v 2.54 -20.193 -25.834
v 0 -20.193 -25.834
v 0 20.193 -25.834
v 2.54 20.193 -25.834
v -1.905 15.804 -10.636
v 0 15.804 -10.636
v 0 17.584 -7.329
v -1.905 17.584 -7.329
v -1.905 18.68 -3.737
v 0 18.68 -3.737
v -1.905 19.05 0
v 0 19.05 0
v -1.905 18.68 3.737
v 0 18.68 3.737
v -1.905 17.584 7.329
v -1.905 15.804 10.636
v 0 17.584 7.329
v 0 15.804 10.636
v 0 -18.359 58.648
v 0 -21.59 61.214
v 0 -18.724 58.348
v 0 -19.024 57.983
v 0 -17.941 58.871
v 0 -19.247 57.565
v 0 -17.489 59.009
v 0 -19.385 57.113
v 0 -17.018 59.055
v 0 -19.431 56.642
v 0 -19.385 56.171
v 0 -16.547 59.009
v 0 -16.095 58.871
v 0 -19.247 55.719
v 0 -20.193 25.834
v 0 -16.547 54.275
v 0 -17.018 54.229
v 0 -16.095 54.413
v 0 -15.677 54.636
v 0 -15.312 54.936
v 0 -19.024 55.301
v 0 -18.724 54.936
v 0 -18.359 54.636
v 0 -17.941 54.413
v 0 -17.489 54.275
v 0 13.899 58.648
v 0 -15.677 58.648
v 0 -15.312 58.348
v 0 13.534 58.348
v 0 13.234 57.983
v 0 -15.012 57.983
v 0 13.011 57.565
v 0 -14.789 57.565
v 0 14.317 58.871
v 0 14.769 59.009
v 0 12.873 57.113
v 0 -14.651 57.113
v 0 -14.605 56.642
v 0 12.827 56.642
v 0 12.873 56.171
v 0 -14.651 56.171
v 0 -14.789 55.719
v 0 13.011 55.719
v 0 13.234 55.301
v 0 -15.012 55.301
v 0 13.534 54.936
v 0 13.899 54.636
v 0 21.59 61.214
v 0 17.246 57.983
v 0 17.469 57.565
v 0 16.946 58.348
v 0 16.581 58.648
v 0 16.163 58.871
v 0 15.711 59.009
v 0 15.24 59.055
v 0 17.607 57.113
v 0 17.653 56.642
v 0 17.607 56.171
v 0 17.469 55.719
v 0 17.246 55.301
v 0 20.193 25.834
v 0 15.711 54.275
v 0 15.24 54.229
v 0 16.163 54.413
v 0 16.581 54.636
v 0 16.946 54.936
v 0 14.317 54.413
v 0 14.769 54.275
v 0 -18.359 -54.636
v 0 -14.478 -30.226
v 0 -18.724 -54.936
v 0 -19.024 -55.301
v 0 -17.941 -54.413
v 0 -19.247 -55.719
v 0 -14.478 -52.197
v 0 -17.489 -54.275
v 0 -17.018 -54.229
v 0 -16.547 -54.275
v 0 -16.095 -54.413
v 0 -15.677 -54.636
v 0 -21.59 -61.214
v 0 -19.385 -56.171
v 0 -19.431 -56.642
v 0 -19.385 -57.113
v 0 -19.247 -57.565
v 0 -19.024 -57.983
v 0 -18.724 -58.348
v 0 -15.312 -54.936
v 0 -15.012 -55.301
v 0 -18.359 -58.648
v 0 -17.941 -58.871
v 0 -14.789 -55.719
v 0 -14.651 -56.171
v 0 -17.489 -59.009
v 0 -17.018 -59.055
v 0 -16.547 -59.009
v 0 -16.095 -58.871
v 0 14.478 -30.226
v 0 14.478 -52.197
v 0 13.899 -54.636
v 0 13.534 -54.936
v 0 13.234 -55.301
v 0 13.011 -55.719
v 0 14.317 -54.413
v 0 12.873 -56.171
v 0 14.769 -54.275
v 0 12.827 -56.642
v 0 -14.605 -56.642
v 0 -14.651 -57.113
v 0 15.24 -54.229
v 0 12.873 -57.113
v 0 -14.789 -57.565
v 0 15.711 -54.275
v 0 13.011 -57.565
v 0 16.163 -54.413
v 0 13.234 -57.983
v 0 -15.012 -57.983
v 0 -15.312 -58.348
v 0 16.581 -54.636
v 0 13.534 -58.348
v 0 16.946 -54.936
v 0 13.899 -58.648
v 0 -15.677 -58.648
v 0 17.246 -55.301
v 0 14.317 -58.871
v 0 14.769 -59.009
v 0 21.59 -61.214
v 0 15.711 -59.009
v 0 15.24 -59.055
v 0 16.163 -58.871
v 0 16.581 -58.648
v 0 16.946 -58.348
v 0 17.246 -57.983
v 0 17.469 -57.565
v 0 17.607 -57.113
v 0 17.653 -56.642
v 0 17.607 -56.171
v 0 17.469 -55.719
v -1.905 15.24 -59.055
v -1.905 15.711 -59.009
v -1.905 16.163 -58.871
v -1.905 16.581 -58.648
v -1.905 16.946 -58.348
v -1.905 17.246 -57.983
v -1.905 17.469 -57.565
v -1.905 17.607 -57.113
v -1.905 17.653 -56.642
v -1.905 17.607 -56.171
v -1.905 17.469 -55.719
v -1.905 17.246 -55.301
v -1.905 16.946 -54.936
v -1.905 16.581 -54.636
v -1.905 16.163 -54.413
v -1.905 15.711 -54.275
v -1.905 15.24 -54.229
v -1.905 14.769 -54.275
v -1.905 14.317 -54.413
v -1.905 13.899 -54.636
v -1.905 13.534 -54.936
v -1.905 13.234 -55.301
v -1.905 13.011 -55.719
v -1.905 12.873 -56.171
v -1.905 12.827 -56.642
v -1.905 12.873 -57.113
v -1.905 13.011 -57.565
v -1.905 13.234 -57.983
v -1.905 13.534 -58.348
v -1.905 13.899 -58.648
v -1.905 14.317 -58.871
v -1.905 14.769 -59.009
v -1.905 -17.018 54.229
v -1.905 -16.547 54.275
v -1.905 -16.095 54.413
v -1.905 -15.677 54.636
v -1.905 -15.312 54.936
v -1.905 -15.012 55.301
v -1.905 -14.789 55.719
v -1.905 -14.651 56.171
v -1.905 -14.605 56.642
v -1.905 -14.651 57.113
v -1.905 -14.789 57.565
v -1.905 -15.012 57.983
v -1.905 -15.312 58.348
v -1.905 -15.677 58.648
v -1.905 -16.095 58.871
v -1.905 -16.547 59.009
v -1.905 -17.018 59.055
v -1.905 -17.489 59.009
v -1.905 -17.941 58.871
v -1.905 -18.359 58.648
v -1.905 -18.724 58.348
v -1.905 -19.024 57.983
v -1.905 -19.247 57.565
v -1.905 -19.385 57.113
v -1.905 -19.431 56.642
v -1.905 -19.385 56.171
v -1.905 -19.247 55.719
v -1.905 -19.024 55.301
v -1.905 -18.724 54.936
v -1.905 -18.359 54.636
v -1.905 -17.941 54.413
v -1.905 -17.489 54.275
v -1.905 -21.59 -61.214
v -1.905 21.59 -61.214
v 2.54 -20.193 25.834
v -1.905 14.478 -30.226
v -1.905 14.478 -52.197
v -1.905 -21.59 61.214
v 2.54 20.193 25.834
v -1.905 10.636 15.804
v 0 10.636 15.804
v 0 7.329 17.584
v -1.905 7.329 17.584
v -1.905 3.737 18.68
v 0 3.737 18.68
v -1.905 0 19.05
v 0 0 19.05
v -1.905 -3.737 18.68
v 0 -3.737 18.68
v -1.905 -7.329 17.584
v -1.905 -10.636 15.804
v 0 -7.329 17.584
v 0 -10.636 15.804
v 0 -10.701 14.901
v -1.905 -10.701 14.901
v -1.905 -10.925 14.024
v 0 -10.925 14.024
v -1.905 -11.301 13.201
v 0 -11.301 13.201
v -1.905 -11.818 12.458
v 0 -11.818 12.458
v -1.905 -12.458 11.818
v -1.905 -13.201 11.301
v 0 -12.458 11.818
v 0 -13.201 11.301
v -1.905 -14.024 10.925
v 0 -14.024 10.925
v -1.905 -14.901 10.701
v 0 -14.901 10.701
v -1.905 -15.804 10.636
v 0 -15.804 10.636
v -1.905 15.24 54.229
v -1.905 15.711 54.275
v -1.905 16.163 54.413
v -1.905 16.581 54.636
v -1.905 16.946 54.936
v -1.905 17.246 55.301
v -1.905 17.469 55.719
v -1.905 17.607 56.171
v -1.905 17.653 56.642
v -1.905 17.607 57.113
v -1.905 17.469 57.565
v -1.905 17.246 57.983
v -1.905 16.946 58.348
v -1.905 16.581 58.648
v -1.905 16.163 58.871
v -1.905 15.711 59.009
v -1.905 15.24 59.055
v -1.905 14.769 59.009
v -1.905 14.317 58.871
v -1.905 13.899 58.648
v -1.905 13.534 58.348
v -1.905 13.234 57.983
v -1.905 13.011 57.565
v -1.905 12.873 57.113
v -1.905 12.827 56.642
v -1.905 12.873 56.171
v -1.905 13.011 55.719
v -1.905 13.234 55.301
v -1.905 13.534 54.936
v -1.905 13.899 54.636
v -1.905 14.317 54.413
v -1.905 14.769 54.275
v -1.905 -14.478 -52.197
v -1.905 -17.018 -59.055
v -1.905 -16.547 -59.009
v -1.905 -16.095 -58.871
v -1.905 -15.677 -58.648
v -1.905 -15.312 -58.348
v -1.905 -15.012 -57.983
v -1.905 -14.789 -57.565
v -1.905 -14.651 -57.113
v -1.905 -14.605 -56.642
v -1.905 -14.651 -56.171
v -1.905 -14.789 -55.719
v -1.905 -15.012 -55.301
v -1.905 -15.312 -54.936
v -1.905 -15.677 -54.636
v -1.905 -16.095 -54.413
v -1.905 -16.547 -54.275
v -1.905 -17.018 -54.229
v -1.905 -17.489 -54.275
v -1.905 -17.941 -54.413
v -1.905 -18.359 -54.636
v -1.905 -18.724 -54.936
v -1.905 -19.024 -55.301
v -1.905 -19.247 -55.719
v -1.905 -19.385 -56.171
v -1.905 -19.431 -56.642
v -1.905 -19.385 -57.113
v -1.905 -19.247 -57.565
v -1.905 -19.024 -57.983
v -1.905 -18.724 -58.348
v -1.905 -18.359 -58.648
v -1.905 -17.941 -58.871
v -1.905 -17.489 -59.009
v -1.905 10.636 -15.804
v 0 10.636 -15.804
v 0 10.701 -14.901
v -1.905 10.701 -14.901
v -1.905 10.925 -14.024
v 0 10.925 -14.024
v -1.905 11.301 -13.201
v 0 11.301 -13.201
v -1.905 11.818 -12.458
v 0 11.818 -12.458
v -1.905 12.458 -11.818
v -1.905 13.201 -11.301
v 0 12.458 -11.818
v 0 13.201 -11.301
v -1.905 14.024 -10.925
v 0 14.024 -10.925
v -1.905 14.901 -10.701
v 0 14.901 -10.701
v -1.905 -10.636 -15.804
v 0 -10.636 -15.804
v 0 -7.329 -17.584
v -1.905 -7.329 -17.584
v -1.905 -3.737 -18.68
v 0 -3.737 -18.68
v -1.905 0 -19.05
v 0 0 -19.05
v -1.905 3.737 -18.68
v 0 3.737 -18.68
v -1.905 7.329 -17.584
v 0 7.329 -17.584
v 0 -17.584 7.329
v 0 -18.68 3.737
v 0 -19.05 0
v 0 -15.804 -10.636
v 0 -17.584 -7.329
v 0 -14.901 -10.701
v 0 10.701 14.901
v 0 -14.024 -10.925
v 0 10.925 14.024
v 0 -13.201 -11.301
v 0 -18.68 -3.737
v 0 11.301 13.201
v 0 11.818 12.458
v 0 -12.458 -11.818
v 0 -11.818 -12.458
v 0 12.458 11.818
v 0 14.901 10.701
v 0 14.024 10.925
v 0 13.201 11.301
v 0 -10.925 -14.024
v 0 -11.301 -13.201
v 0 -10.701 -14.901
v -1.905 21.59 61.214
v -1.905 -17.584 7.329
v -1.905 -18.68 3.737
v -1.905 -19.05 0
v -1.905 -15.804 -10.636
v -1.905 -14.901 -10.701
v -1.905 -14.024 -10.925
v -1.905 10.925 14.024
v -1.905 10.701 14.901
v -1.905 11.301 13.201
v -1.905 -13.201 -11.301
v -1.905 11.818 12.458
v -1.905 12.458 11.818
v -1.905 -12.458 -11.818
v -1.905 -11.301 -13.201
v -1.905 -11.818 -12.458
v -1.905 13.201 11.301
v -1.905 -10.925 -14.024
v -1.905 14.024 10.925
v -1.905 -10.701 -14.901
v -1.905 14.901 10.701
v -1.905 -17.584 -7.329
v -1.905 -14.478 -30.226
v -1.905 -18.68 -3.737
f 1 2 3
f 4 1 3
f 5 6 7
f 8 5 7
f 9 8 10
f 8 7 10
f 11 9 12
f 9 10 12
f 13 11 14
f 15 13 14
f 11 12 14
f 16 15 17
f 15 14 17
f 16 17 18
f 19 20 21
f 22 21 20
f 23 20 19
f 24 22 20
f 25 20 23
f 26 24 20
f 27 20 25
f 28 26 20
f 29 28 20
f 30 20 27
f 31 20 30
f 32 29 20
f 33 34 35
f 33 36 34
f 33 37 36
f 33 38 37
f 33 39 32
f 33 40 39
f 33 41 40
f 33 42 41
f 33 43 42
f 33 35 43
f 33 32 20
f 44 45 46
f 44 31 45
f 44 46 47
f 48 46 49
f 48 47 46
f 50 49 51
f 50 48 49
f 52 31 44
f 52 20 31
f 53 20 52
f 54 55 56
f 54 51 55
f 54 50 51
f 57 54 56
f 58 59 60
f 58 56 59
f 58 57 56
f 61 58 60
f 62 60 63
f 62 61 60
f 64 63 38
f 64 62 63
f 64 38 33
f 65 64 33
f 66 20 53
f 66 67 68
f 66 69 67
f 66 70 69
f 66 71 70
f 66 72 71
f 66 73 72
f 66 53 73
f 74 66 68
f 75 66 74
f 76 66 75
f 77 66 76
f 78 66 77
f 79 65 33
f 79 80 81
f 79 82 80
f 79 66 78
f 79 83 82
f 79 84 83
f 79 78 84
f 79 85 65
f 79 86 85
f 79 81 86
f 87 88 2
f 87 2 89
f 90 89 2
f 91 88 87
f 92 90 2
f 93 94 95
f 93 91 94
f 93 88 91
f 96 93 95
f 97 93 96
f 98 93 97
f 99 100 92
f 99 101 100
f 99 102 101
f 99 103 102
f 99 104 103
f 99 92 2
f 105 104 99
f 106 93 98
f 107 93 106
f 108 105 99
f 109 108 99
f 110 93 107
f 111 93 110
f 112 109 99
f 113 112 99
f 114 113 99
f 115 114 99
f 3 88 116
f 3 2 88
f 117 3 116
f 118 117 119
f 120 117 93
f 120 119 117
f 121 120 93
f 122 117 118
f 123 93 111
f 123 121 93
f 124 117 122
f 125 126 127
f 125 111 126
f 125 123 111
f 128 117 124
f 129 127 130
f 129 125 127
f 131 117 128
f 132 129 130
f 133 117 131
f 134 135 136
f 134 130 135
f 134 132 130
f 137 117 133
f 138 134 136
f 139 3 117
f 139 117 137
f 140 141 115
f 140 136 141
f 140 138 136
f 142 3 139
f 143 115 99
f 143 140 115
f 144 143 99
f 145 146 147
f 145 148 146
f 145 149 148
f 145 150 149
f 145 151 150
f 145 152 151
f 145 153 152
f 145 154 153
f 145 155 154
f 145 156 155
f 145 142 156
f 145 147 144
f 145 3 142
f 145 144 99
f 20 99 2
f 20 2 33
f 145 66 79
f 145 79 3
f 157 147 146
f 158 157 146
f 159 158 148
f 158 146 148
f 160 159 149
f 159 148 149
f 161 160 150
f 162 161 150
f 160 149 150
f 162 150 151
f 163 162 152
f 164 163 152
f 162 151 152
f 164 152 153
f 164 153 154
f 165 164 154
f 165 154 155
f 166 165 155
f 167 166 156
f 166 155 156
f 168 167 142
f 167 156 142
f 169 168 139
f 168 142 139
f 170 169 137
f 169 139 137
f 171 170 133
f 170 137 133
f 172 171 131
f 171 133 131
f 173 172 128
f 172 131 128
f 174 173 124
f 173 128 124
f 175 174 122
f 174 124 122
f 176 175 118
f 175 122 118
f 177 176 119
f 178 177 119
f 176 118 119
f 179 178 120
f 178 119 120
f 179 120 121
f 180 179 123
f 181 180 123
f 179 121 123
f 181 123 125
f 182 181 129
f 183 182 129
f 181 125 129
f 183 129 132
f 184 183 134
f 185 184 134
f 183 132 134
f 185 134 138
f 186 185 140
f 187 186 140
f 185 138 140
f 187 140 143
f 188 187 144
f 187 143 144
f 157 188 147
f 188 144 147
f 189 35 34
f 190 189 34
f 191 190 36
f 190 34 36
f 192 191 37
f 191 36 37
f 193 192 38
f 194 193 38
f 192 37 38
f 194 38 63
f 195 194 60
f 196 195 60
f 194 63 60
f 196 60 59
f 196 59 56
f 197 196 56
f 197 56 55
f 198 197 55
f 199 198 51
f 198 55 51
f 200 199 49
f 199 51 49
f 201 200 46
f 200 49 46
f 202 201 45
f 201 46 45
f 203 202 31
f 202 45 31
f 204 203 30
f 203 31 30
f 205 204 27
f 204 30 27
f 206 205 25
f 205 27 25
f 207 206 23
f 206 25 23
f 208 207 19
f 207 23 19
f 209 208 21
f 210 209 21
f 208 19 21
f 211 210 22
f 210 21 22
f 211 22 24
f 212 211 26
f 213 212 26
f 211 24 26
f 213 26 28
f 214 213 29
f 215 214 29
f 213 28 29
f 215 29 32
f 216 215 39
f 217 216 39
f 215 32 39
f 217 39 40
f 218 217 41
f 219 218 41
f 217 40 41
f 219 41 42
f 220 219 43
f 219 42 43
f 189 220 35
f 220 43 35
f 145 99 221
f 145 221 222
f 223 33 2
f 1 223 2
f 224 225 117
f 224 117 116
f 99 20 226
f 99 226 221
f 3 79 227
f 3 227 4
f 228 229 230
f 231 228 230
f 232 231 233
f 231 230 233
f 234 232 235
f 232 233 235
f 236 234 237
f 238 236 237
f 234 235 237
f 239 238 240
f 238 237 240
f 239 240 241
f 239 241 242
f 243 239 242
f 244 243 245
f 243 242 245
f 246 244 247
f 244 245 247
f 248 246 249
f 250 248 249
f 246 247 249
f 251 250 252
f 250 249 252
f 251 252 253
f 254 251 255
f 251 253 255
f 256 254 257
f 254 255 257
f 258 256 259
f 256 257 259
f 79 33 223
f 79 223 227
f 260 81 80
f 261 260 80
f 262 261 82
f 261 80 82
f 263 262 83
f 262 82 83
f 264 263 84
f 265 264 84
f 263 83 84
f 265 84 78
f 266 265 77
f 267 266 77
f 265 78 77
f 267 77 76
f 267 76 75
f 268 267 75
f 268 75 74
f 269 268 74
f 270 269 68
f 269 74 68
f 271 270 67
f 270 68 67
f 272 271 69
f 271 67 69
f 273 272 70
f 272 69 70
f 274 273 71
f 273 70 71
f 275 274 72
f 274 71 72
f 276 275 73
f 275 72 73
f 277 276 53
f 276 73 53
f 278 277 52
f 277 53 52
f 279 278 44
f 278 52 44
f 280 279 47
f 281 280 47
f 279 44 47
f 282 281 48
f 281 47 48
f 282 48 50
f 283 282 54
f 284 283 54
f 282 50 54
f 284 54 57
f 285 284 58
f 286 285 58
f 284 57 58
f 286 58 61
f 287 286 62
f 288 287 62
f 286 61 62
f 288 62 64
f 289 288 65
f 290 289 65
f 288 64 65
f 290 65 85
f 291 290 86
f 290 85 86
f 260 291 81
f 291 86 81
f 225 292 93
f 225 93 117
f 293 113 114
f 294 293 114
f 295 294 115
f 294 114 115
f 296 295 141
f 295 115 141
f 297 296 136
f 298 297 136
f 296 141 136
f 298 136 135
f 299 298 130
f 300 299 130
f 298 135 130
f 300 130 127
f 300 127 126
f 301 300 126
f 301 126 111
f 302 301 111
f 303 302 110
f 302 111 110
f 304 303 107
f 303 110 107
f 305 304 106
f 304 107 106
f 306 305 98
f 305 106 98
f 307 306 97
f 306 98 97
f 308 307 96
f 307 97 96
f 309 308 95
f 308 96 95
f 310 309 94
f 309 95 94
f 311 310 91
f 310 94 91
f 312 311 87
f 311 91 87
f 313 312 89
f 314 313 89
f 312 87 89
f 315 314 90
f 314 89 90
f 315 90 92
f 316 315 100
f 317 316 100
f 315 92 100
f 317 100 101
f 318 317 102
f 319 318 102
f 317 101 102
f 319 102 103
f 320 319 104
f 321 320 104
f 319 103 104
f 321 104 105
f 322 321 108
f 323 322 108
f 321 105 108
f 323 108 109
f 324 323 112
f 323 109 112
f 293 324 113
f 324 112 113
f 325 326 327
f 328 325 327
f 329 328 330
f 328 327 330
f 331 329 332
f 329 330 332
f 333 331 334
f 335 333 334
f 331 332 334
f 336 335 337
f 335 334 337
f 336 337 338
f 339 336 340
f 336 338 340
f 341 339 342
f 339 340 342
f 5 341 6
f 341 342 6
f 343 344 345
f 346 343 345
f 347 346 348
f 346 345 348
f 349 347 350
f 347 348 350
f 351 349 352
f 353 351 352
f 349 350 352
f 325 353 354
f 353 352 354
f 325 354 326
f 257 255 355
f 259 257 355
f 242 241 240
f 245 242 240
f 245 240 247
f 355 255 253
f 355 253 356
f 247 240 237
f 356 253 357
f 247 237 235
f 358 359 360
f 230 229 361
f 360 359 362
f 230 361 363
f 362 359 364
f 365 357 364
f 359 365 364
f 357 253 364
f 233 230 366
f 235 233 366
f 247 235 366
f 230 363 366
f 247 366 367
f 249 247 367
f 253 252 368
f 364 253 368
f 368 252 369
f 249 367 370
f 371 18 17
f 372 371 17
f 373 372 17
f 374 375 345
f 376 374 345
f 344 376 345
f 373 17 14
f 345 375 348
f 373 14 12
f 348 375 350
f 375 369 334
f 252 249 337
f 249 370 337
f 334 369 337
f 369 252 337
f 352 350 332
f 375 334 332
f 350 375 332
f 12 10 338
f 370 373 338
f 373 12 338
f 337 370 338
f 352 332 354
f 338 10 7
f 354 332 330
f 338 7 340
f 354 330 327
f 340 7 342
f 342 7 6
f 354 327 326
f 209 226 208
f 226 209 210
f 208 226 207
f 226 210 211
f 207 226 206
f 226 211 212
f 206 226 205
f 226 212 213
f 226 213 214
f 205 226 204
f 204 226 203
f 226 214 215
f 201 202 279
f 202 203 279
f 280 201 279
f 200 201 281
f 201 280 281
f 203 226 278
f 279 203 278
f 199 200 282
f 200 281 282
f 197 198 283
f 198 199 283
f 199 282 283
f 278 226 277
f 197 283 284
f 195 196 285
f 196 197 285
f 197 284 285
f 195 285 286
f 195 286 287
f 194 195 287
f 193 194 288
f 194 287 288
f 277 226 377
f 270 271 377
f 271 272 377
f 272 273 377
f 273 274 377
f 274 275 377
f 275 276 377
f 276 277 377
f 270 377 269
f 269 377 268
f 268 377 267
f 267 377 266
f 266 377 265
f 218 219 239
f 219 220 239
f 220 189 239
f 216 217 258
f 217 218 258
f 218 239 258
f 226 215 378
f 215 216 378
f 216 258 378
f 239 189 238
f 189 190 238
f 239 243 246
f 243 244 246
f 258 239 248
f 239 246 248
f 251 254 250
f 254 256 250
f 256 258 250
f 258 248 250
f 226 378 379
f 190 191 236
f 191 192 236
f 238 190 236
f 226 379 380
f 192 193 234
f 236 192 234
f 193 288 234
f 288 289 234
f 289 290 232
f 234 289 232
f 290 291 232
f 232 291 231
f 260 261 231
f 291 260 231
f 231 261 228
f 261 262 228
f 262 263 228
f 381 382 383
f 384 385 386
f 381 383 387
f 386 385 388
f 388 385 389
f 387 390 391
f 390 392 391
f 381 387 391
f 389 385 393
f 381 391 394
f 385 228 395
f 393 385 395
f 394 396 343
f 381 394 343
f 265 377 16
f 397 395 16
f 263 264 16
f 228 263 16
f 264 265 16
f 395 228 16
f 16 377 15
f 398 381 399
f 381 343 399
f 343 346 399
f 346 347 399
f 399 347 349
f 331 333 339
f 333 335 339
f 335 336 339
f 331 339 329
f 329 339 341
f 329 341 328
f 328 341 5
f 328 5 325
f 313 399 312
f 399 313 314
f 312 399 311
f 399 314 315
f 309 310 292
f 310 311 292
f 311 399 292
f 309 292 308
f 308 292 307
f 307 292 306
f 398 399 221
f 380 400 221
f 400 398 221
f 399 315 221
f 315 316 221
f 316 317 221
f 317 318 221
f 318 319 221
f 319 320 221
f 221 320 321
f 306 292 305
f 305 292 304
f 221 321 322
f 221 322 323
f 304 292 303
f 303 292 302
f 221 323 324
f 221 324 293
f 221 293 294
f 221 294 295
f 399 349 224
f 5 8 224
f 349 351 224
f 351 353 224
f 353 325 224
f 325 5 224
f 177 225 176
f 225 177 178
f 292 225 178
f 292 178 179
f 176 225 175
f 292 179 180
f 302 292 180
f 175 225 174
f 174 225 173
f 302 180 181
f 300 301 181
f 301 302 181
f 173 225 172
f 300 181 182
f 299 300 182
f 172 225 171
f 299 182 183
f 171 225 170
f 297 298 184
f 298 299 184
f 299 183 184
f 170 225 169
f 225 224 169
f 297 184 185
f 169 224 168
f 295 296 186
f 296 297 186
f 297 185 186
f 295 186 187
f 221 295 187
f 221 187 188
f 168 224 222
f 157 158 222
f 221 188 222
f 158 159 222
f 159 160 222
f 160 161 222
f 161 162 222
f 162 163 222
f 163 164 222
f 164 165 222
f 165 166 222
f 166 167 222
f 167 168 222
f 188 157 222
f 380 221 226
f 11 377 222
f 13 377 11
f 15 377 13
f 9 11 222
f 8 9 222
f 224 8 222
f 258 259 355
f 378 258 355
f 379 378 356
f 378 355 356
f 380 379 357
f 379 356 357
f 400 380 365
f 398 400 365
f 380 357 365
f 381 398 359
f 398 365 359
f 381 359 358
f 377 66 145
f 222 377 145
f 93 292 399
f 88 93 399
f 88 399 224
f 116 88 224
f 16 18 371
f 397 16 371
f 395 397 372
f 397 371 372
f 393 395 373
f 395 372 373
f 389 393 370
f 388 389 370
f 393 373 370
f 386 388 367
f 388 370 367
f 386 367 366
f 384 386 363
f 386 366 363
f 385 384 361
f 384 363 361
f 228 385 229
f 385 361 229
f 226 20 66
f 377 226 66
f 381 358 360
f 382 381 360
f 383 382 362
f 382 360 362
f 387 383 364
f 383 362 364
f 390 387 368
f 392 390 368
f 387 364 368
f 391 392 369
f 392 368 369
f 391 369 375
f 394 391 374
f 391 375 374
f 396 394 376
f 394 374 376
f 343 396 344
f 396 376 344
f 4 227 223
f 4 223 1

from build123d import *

# Parameters (mm, degrees)
SKETCH1_W           = 122.428
SKETCH1_H           = 43.18
BOSS_EXTRUDE1_DEPTH = 1.905
SKETCH2_R           = 2.413
CUT_EXTRUDE1_DEPTH  = 1.905
CUT_EXTRUDE2_DEPTH  = 1.905
SKETCH4_W           = 21.971
SKETCH4_H           = 28.956
CUT_EXTRUDE3_DEPTH  = 1.905
SKETCH5_W           = 51.6678832
SKETCH5_H           = 40.386705486
BOSS_EXTRUDE2_DEPTH = 2.54


with BuildPart() as part:
    # Sketch1 → Boss-Extrude1 (new body)
    with BuildSketch(Plane(origin=(0, 0, 0), x_dir=(0, 0, -1), z_dir=(1, 0, 0))):
        Rectangle(SKETCH1_W, SKETCH1_H)
    extrude(amount=-BOSS_EXTRUDE1_DEPTH)

    # Sketch2 → Cut-Extrude1 (cut)
    with BuildSketch(Plane(origin=(0, 0, 0), x_dir=(0, 0, -1), z_dir=(1, 0, 0))):
        with Locations((-56.642, 15.24)):
            Circle(SKETCH2_R)
        with Locations((-56.642, -17.018)):
            Circle(SKETCH2_R)
        with Locations((56.642, 15.24)):
            Circle(SKETCH2_R)
        with Locations((56.642, -17.018)):
            Circle(SKETCH2_R)
    extrude(amount=-CUT_EXTRUDE1_DEPTH, mode=Mode.SUBTRACT)

    # Sketch3 → Cut-Extrude2 (cut)
    with BuildSketch(Plane(origin=(0, 0, 0), x_dir=(0, 0, -1), z_dir=(1, 0, 0))):
        with BuildLine():
            ThreePointArc((-10.636223834, -15.804215974), (0, -19.05), (10.636223834, -15.804215974))
            ThreePointArc((10.636223834, -15.804215974), (12.123345763, -12.123345763), (15.804215974, -10.636223834))
            ThreePointArc((15.804215974, -10.636223834), (19.05, 0), (15.804215974, 10.636223834))
            ThreePointArc((15.804215974, 10.636223834), (12.123345763, 12.123345763), (10.636223834, 15.804215974))
            ThreePointArc((10.636223834, 15.804215974), (0, 19.05), (-10.636223834, 15.804215974))
            ThreePointArc((-10.636223834, 15.804215974), (-12.123345763, 12.123345763), (-15.804215974, 10.636223834))
            ThreePointArc((-15.804215974, 10.636223834), (-19.05, 0), (-15.804215974, -10.636223834))
            ThreePointArc((-15.804215974, -10.636223834), (-12.123345763, -12.123345763), (-10.636223834, -15.804215974))
        make_face()
    extrude(amount=-CUT_EXTRUDE2_DEPTH, mode=Mode.SUBTRACT)

    # Sketch4 → Cut-Extrude3 (cut)
    with BuildSketch(Plane.ZY.offset(1.905)):
        with Locations((-41.2115, 0)):
            Rectangle(SKETCH4_W, SKETCH4_H)
    extrude(amount=-CUT_EXTRUDE3_DEPTH, mode=Mode.SUBTRACT)

    # Sketch5 → Boss-Extrude2 (add)
    with BuildSketch(Plane(origin=(0, 0, 0), x_dir=(0, 0, -1), z_dir=(1, 0, 0))):
        Rectangle(SKETCH5_W, SKETCH5_H)
    extrude(amount=BOSS_EXTRUDE2_DEPTH)


solid = part.part
